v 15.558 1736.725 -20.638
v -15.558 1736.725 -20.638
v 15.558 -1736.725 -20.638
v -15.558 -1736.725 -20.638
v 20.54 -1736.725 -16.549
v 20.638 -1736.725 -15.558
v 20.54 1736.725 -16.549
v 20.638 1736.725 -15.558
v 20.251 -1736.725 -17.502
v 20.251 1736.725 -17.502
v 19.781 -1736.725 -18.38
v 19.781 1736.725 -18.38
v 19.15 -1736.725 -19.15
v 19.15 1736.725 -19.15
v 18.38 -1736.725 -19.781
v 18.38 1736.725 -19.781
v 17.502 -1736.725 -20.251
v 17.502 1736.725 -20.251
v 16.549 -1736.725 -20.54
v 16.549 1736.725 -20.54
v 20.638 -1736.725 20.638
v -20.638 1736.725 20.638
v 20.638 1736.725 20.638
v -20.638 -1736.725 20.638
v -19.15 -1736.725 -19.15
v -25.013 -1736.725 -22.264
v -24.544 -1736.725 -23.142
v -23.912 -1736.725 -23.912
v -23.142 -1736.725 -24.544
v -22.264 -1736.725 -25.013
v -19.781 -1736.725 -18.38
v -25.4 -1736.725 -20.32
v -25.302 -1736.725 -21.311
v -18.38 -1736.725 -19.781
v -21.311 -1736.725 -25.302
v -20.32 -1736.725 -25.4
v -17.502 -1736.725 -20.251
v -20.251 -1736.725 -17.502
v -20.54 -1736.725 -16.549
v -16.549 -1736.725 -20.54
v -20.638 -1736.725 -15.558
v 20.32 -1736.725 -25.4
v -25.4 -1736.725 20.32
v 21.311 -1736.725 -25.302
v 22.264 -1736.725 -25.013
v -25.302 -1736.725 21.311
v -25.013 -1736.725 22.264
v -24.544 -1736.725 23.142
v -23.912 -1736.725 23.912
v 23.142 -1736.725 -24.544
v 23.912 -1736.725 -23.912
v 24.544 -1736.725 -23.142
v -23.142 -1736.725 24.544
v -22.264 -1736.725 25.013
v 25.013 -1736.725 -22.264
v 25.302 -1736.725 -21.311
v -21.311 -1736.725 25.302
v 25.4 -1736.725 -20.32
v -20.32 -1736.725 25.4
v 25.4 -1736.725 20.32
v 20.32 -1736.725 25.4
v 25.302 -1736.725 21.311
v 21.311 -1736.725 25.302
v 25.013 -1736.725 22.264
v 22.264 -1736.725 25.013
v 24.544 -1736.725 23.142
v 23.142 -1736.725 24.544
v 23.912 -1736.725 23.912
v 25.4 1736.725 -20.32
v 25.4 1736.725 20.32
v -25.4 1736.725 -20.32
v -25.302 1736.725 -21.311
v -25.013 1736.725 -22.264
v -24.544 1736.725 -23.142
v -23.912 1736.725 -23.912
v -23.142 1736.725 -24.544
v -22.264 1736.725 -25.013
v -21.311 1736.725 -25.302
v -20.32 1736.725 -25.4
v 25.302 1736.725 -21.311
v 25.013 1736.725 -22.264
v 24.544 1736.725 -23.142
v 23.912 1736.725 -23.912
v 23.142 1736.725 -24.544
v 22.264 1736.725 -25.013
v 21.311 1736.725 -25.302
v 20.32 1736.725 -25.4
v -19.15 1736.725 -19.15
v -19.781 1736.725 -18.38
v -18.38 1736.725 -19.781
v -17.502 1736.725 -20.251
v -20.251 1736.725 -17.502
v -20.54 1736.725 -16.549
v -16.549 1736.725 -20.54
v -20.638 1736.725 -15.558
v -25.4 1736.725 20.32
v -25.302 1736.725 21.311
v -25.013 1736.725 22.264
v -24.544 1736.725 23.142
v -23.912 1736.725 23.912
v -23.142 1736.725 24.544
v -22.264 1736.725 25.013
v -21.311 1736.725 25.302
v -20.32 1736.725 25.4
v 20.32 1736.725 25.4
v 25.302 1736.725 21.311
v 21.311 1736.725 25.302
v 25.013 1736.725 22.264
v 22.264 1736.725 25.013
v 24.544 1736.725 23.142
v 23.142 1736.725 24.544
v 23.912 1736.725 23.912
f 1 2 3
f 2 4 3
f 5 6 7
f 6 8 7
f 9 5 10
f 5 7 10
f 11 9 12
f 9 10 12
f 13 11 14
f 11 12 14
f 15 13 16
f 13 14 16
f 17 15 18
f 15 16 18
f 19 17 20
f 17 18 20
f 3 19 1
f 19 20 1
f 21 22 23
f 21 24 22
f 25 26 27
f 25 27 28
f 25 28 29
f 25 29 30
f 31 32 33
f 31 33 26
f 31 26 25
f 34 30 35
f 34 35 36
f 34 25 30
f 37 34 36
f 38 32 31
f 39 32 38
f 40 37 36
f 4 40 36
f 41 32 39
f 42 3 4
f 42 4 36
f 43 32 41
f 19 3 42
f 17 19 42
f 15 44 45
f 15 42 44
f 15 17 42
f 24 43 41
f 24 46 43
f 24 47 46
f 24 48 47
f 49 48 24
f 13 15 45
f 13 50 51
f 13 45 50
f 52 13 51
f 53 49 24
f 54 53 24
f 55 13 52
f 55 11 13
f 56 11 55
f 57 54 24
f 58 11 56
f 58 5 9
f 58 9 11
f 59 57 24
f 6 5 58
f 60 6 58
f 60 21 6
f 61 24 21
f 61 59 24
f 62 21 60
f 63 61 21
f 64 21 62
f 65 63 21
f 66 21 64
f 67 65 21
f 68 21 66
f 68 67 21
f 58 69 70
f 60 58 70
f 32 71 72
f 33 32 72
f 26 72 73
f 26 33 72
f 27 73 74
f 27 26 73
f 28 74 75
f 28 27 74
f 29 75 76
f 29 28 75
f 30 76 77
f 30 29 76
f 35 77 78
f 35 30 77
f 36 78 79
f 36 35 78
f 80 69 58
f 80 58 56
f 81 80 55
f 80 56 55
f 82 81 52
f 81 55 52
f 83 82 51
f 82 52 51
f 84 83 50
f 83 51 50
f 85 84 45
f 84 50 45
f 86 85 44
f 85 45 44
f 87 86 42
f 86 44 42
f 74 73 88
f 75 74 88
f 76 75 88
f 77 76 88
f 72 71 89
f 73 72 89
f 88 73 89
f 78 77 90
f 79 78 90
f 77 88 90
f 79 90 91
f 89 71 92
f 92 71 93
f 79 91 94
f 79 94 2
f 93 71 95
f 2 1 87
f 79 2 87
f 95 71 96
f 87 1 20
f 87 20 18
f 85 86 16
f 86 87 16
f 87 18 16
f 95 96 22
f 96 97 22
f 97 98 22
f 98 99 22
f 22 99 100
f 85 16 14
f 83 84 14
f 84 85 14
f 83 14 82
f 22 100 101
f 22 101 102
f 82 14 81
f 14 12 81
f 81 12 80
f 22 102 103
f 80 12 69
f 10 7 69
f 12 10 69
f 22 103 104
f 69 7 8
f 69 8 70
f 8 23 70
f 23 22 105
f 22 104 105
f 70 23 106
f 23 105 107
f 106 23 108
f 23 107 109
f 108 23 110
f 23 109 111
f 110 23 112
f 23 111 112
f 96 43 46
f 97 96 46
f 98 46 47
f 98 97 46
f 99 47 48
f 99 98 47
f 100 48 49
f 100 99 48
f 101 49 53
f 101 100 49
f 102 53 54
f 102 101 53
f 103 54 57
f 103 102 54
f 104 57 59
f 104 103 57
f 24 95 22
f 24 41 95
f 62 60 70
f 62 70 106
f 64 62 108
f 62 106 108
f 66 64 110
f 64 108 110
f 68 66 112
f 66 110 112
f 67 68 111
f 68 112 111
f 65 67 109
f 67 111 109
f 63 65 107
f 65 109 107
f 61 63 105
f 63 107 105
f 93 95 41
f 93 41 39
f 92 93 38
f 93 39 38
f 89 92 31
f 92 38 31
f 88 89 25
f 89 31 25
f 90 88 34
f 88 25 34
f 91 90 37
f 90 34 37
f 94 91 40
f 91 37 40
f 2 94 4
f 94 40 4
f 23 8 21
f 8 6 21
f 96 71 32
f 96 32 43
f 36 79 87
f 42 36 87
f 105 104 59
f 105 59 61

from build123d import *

# Parameters (mm, degrees)
F0_W     = 50.8
F0_H     = 50.8
F0_W_2   = 41.275
F0_H_2   = 41.275
F1_DEPTH = 1736.725
F2_R     = 5.08


with BuildPart() as f1:
    # F0 (on Front) → F1 (new body, symmetric)
    with BuildSketch(Plane.XZ):
        Rectangle(F0_W, F0_H)
        Rectangle(F0_W_2, F0_H_2, mode=Mode.SUBTRACT)
    extrude(amount=F1_DEPTH, both=True)

    # F2
    f2_edges = [f1.edges().sort_by_distance(p)[0] for p in [
        (-25.4, 0, 25.4),
        (25.4, 0, 25.4),
        (-20.6375, 0, -20.6375),
        (20.6375, 0, -20.6375),
        (25.4, 0, -25.4),
        (-25.4, 0, -25.4),
    ]]
    fillet(f2_edges, radius=F2_R)


solid = f1.part
